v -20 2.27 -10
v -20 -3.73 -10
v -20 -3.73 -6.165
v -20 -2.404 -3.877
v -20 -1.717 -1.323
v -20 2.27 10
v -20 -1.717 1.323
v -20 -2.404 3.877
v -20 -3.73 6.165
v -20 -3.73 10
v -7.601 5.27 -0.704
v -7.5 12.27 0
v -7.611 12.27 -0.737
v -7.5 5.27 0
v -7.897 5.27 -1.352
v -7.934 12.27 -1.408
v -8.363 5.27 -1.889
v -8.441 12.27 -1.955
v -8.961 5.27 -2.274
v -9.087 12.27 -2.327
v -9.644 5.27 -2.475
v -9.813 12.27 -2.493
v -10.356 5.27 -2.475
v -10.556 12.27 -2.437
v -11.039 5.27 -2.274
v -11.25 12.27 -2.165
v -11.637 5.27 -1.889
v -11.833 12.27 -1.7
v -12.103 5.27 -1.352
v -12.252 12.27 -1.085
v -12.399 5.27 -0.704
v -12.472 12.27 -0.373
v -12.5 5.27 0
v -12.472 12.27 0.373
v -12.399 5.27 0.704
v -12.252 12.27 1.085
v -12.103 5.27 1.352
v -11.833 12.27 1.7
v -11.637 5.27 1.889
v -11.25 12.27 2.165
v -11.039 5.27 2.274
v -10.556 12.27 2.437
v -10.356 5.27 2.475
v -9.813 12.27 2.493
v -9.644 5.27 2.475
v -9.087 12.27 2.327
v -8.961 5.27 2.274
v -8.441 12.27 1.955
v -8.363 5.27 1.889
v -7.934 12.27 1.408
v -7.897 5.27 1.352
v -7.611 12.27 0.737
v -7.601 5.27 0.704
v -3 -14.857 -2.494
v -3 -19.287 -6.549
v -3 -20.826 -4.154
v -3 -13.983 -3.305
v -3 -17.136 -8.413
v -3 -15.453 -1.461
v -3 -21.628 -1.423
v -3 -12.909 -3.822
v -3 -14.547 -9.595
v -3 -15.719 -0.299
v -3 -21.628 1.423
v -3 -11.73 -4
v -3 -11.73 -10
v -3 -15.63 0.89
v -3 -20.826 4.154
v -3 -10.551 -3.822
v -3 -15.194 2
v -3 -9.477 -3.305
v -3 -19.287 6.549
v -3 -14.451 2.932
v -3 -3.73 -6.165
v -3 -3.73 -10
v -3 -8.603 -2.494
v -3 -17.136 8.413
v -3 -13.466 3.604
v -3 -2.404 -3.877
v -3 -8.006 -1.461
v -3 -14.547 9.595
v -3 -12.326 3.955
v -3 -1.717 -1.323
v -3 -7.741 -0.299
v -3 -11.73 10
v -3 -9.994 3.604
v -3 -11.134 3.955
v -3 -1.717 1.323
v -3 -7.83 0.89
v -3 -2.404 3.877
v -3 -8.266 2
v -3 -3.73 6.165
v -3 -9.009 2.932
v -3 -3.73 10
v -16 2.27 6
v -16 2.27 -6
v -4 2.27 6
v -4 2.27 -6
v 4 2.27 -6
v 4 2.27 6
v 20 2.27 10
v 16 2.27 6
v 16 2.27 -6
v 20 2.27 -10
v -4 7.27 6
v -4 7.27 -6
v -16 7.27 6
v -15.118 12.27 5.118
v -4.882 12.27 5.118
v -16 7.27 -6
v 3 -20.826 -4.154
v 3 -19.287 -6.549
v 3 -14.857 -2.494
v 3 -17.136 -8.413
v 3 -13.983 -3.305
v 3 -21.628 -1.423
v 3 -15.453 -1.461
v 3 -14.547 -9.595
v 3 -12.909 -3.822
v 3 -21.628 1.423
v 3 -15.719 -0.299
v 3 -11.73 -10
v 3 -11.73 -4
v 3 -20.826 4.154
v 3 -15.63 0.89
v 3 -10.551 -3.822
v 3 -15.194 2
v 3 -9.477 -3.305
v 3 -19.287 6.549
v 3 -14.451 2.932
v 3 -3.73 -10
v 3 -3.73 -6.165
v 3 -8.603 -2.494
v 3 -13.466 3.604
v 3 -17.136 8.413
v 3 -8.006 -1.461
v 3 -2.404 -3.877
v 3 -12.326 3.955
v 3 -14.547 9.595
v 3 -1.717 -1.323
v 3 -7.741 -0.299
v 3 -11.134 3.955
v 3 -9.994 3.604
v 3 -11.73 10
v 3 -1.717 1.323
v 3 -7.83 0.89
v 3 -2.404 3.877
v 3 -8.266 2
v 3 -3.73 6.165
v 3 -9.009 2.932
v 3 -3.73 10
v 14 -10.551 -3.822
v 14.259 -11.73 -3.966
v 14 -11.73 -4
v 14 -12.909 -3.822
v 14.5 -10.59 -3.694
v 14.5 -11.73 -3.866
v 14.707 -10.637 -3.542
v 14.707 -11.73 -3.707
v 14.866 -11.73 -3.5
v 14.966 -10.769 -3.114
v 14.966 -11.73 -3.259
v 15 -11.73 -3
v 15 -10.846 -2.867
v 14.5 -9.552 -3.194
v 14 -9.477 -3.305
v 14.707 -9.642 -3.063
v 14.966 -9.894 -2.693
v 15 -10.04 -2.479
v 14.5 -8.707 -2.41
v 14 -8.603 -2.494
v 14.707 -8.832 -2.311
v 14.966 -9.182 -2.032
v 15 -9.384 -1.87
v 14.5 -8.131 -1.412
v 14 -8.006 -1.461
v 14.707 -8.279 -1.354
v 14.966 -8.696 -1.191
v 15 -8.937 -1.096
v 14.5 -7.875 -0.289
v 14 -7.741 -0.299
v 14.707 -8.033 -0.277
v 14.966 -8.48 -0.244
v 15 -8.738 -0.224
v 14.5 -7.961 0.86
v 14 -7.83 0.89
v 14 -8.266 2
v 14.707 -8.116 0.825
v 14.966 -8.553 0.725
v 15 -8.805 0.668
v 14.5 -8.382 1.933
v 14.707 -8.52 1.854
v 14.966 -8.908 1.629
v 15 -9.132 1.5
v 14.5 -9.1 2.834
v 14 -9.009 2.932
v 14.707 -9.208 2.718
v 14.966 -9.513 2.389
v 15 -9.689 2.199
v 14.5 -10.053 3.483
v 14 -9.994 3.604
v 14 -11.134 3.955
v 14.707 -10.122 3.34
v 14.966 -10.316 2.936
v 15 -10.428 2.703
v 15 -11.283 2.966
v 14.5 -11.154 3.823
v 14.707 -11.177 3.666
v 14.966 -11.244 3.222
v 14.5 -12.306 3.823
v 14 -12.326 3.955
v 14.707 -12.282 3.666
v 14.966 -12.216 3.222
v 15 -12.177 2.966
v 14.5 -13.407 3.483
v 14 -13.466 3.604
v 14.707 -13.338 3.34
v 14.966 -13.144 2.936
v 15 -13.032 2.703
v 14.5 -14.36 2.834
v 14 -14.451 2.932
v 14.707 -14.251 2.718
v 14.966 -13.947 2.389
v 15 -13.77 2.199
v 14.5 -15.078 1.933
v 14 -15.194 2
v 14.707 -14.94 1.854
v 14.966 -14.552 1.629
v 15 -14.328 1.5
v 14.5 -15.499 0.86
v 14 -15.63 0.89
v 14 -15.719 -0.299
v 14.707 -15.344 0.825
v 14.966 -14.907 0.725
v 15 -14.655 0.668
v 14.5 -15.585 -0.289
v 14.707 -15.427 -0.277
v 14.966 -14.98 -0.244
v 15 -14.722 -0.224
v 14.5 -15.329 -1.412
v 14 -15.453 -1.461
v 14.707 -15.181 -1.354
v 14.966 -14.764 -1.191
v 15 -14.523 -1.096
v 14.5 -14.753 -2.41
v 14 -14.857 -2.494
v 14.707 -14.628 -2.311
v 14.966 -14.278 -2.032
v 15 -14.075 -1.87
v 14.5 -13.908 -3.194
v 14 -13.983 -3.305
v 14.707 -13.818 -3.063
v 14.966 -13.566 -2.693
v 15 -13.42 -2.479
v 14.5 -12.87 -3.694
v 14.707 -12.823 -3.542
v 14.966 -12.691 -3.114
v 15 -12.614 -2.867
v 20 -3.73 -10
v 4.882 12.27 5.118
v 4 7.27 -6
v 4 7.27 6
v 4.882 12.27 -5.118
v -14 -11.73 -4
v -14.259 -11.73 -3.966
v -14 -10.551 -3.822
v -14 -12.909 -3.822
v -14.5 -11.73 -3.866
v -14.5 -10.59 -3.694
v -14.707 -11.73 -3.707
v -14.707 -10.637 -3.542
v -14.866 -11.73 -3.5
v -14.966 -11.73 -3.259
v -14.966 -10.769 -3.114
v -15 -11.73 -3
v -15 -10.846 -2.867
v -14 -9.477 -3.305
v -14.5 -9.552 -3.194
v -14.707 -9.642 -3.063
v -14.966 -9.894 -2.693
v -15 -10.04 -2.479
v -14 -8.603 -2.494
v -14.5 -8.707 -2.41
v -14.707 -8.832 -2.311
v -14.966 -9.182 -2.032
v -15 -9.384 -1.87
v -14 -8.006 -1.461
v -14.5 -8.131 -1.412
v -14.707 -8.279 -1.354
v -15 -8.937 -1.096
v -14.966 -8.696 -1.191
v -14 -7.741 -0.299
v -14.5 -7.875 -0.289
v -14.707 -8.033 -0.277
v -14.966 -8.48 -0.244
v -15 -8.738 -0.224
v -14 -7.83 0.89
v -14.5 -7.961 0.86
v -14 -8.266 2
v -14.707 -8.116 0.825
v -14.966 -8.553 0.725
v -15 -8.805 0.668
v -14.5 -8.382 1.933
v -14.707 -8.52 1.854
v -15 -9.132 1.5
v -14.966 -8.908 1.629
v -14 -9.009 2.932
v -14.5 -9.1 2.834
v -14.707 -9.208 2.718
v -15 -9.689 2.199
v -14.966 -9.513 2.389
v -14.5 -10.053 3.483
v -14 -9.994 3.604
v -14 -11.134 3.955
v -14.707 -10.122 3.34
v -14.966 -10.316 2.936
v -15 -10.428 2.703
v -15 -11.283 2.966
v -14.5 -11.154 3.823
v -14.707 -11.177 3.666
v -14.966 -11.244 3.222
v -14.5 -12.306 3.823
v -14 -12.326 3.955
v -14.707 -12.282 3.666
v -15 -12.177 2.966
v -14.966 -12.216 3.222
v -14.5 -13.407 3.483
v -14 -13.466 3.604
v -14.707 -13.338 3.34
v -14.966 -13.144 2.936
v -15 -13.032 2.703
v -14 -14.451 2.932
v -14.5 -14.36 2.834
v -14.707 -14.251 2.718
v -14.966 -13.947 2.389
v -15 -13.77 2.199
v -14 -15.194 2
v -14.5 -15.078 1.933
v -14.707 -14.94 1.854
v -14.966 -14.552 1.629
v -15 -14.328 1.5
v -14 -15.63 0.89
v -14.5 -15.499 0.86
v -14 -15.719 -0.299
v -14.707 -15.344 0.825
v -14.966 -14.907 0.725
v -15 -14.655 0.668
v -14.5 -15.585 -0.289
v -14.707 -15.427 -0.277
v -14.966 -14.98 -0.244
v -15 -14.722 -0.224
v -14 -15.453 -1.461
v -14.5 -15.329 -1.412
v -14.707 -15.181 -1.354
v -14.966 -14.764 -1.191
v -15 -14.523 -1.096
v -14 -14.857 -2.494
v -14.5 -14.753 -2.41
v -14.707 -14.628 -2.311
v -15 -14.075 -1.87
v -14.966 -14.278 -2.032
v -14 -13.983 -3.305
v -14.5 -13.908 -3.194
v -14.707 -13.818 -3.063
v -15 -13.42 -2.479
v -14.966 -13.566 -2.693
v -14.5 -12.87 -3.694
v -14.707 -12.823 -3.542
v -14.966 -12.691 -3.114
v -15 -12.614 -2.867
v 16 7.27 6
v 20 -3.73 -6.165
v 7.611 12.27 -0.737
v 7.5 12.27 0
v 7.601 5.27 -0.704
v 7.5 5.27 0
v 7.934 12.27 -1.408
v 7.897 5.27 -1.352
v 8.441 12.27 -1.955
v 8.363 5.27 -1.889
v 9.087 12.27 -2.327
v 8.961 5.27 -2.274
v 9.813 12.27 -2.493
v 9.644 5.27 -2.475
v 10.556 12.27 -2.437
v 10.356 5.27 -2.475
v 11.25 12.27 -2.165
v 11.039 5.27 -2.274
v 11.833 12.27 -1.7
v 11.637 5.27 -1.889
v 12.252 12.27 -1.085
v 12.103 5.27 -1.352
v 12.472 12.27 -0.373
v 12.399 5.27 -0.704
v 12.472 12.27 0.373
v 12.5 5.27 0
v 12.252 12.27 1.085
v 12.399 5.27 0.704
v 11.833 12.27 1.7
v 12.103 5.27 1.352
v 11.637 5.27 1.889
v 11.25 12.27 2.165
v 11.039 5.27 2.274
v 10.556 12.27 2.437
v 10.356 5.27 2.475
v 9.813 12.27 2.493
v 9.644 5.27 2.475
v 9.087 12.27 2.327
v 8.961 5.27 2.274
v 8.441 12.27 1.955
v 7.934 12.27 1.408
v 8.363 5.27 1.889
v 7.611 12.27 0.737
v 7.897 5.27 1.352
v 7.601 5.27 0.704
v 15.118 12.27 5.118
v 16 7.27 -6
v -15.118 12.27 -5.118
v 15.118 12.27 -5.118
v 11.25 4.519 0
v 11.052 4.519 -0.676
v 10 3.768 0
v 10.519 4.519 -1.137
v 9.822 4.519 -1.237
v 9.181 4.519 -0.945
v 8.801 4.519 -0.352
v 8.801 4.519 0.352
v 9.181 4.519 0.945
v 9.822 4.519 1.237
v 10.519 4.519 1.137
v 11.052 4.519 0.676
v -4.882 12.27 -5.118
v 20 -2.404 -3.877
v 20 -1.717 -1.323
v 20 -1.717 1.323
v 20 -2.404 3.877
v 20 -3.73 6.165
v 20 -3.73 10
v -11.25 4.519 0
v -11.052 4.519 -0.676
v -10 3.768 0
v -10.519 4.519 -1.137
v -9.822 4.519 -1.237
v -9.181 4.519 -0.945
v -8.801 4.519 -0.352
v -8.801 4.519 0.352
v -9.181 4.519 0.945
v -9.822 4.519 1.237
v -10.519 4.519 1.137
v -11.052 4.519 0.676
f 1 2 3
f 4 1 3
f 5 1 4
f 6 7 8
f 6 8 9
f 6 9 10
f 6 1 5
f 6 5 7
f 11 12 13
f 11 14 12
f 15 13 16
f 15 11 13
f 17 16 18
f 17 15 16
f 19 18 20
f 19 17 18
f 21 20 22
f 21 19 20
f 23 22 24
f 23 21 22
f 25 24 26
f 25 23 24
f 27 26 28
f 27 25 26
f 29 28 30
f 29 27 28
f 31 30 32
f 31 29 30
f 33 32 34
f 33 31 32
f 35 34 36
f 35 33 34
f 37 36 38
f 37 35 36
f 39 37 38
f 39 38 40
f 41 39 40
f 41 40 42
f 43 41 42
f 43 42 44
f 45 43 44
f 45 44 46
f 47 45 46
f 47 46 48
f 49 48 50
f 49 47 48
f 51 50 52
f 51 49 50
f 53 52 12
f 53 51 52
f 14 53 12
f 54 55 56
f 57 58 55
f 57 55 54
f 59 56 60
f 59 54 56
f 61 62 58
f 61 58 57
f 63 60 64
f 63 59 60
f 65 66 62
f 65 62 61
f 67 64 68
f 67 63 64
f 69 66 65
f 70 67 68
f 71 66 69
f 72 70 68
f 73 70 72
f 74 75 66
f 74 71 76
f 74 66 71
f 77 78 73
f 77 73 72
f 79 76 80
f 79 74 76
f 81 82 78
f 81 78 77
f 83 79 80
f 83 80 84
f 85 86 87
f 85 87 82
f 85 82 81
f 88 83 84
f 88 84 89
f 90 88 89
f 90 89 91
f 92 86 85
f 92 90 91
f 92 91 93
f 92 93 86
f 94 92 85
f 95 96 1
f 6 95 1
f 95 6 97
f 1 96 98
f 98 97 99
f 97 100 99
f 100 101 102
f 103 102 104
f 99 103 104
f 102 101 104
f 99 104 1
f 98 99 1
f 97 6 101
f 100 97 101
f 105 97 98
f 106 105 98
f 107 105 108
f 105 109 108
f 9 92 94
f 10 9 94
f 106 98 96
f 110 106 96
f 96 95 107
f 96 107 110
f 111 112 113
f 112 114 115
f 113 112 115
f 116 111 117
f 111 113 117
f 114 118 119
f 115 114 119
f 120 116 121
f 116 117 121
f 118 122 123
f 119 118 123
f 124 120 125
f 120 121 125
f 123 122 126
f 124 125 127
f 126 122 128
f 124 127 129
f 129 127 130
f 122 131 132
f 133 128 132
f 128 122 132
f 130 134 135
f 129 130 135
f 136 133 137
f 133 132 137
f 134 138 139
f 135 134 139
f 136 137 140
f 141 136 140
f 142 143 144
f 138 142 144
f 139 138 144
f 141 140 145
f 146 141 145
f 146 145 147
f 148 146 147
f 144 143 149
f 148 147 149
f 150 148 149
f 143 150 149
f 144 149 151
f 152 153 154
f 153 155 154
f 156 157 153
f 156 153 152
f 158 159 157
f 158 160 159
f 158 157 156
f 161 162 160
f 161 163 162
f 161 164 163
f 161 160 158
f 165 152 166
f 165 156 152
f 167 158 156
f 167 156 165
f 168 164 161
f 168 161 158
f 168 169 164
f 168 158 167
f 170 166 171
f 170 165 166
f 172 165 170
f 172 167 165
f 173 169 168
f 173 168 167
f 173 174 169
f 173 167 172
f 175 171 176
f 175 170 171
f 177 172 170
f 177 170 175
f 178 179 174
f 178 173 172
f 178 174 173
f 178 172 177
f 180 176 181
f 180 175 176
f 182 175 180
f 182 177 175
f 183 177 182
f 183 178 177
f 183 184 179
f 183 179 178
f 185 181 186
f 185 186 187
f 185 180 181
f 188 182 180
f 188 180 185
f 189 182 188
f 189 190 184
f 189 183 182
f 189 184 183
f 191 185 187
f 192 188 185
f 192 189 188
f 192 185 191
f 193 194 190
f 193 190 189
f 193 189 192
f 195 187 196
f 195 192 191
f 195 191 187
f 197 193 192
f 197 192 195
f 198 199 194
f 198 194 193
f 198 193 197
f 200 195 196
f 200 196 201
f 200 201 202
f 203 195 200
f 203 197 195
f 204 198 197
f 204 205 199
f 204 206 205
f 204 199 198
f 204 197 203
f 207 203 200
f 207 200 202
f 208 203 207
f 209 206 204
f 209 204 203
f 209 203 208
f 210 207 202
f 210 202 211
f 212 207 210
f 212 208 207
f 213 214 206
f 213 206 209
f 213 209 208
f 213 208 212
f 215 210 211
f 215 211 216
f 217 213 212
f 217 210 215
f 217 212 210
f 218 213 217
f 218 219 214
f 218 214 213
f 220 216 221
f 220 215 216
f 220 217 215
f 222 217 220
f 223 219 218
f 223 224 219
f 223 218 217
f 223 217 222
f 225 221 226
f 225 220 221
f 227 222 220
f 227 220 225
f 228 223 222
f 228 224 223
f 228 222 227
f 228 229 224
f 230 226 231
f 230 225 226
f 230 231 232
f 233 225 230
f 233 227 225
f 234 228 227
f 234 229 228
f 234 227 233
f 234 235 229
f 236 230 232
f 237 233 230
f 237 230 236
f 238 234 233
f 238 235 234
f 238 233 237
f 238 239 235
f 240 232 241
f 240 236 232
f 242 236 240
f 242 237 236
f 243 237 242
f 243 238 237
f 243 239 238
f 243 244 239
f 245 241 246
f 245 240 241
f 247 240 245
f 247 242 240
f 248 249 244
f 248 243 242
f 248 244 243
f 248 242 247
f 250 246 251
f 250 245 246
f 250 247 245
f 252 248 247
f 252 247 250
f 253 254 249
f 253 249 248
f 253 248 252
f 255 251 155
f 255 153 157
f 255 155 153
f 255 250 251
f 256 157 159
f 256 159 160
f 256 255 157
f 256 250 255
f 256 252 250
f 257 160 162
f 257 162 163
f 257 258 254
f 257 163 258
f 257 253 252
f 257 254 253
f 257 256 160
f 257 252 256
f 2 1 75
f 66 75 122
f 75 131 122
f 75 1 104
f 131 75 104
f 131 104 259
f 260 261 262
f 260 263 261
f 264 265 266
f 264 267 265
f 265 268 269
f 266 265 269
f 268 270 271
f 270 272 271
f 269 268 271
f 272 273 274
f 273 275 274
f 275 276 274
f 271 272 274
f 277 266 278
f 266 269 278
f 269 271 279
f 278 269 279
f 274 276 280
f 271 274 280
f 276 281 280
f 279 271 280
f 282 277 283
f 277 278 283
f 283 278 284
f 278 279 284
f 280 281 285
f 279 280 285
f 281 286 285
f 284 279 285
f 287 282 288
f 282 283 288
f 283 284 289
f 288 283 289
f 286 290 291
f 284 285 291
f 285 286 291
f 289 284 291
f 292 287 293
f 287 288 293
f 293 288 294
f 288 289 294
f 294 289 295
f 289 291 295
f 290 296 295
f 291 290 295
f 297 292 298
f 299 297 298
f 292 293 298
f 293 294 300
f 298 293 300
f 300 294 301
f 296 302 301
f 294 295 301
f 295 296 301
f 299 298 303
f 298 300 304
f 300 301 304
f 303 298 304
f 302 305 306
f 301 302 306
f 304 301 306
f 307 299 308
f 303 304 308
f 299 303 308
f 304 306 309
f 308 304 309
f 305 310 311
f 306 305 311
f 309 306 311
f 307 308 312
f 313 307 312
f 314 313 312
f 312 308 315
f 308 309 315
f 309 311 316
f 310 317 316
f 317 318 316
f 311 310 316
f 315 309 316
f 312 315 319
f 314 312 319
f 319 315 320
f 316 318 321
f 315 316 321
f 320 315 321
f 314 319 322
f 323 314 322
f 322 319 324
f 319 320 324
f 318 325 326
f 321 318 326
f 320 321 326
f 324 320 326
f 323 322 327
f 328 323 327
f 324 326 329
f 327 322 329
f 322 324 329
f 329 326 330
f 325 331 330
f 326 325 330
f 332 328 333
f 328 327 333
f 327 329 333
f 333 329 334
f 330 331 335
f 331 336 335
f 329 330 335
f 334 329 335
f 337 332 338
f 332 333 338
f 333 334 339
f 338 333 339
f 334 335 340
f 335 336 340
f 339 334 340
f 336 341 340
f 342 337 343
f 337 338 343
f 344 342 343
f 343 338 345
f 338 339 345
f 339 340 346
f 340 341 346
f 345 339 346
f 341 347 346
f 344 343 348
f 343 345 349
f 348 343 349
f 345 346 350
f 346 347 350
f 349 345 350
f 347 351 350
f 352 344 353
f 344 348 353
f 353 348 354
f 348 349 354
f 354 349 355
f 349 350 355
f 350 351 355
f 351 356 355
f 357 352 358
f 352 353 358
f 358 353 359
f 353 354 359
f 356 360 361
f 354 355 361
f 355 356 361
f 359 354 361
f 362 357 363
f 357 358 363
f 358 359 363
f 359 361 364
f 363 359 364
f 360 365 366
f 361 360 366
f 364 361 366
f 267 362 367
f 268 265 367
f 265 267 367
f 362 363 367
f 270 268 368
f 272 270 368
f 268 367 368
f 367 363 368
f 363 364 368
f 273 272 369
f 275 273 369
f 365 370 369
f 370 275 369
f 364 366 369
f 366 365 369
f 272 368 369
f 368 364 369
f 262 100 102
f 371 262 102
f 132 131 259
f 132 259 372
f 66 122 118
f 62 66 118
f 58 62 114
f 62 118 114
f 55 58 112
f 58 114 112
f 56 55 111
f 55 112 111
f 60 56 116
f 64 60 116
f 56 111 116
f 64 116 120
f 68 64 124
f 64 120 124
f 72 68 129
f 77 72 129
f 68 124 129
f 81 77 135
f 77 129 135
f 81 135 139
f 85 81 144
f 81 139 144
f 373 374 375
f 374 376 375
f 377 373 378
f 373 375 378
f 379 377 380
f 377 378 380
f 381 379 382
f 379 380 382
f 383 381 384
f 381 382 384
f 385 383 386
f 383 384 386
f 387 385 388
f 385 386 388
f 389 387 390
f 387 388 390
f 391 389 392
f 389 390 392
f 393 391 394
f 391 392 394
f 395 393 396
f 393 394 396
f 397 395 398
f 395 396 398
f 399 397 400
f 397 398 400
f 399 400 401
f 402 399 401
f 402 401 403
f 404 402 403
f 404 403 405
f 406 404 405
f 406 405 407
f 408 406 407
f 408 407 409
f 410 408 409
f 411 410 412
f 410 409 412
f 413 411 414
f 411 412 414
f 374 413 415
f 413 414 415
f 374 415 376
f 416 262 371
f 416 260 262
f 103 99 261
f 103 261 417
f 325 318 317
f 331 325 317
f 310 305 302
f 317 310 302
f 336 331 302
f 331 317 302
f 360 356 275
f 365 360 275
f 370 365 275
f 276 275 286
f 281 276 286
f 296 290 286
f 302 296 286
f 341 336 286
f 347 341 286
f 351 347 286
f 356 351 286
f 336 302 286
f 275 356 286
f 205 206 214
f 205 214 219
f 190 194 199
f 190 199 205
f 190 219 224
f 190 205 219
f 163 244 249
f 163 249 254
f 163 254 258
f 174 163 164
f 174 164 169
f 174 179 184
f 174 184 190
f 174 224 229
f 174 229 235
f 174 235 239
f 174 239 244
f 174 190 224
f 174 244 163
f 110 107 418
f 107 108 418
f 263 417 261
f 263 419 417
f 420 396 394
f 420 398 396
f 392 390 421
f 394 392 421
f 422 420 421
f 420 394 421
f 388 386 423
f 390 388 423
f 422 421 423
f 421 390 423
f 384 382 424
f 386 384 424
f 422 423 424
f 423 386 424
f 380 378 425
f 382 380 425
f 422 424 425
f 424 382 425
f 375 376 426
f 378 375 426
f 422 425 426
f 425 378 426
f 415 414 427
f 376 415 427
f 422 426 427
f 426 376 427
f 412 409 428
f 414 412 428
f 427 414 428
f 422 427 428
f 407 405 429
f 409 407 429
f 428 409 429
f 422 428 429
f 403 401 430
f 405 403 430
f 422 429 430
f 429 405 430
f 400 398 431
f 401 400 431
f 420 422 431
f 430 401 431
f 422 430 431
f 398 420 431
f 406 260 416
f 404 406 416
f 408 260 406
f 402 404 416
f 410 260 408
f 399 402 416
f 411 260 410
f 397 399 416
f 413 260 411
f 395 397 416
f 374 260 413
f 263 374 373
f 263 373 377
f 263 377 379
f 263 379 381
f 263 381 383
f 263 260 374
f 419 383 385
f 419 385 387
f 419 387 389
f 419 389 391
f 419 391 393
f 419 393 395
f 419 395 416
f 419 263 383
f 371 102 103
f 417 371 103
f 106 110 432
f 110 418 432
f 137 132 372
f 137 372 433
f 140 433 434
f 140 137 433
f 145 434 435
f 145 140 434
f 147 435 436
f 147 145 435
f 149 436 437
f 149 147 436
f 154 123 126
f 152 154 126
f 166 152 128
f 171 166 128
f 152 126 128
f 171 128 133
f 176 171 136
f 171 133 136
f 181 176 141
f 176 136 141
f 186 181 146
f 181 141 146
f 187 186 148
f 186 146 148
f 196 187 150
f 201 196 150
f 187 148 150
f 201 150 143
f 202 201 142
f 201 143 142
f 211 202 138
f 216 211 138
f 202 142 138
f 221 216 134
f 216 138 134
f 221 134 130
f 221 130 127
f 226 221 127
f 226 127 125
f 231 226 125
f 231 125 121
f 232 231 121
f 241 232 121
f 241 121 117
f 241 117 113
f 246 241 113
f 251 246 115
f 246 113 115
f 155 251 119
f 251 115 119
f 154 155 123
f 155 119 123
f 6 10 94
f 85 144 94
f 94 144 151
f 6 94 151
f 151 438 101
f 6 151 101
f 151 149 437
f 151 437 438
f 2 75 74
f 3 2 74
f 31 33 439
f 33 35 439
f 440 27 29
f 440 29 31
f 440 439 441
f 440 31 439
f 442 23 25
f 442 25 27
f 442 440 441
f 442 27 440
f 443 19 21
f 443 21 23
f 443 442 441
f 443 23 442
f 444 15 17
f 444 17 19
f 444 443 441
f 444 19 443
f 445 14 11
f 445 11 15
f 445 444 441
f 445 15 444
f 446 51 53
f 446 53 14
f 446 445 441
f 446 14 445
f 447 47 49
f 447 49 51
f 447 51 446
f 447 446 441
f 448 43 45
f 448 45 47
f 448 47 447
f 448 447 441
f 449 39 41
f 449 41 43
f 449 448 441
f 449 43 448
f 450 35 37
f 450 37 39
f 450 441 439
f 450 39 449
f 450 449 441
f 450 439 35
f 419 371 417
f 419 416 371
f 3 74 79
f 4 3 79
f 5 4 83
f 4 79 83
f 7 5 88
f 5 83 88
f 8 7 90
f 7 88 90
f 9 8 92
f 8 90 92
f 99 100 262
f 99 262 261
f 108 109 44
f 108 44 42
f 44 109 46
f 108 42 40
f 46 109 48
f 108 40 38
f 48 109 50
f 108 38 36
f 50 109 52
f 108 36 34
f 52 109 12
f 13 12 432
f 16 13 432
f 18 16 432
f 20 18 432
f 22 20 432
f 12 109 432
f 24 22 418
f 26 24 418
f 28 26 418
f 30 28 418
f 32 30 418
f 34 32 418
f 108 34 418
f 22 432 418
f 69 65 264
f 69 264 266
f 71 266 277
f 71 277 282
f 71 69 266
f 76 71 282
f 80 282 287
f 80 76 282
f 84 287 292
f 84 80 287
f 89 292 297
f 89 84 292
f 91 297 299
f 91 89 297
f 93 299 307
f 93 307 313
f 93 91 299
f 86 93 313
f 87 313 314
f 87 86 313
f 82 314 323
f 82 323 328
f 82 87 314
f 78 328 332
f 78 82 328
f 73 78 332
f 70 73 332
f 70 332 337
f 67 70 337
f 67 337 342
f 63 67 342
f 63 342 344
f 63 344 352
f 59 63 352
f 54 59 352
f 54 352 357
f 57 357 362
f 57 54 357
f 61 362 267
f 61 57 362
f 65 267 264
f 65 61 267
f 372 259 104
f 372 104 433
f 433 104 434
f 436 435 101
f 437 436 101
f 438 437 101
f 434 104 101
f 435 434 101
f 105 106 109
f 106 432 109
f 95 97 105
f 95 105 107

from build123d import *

# Parameters (mm, degrees)
LEG_CONNECTOR_DEPTH                            = 1.5
TORSO_CONNECTOR_DEPTH                          = 8.5
SKETCH3_R                                      = 2
LEG_PIN_DEPTH                                  = 6
SKETCH4_W                                      = 6
SKETCH4_H                                      = 6
TORSO_PIN_BASE_DEPTH                           = 2.5
SKETCH5_W                                      = 6
SKETCH5_H                                      = 6
TORSO_PIN_TIP_DEPTH                            = 2.5
TORSO_PIN_TIP_TAPER                            = 10
HOLE_THAT_MAKE_IT_EASY_TO_ADD_CENTER_LIN_D     = 2.5
HOLE_THAT_MAKE_IT_EASY_TO_ADD_CENTER_LIN_DEPTH = 3.5
HOLE_THAT_MAKE_IT_EASY_TO_ADD_CENTER_LIN_TIP   = 0.751075774
EASY_LEG_INSERT_R                              = 0.5
SCALE1_SCALE                                   = 2


with BuildPart() as part:
    # Sketch1 → Leg connector (new body)
    with BuildSketch(Plane(origin=(0, 0, 0), x_dir=(0, 0, -1), z_dir=(1, 0, 0))):
        with BuildLine():
            Line((-5, 0), (5, 0))
            Line((5, 0), (5, -7))
            ThreePointArc((5, -7), (0, -12), (-5, -7))
            Line((-5, -7), (-5, 0))
        make_face()
    extrude(amount=LEG_CONNECTOR_DEPTH)

    # Sketch2 → Torso connector (add)
    with BuildSketch(Plane(origin=(1.5, 0, 0), x_dir=(0, 0, -1), z_dir=(1, 0, 0))):
        with BuildLine():
            Line((-5, 0), (5, 0))
            Line((5, 0), (5, -3))
            Line((5, -3), (3.082612528, -3))
            ThreePointArc((3.082612528, -3), (0, -1.95), (-3.082612528, -3))
            Line((-3.082612528, -3), (-5, -3))
            Line((-5, -3), (-5, 0))
        make_face()
    extrude(amount=TORSO_CONNECTOR_DEPTH)

    # Sketch3 → Leg pin (add)
    with BuildSketch(Plane(origin=(1.5, 0, 0), x_dir=(0, 0, -1), z_dir=(1, 0, 0))):
        with Locations((0, -7)):
            Circle(SKETCH3_R)
    extrude(amount=LEG_PIN_DEPTH)

    # Sketch4 → Torso pin base (add)
    with BuildSketch(Plane(origin=(0, 0, 0), x_dir=(1, 0, 0), z_dir=(0, 1, 0))):
        with Locations((5, 0)):
            Rectangle(SKETCH4_W, SKETCH4_H)
    extrude(amount=TORSO_PIN_BASE_DEPTH)

    # Sketch5 → Torso pin tip (add)
    with BuildSketch(Plane(origin=(0, 2.5, 0), x_dir=(1, 0, 0), z_dir=(0, 1, 0))):
        with Locations((5, 0)):
            Rectangle(SKETCH5_W, SKETCH5_H)
    extrude(amount=TORSO_PIN_TIP_DEPTH, taper=TORSO_PIN_TIP_TAPER)

    # Hole that make it easy to add center lines
    with Locations(Plane(origin=(0, 5, 0), x_dir=(1, 0, 0), z_dir=(0, 1, 0))):
        with Locations((5, 0)):
            Hole(HOLE_THAT_MAKE_IT_EASY_TO_ADD_CENTER_LIN_D / 2, depth=HOLE_THAT_MAKE_IT_EASY_TO_ADD_CENTER_LIN_DEPTH)
            with Locations((0, 0, -(HOLE_THAT_MAKE_IT_EASY_TO_ADD_CENTER_LIN_DEPTH + HOLE_THAT_MAKE_IT_EASY_TO_ADD_CENTER_LIN_TIP / 2))):  # 118° drill point
                Cone(0, HOLE_THAT_MAKE_IT_EASY_TO_ADD_CENTER_LIN_D / 2, HOLE_THAT_MAKE_IT_EASY_TO_ADD_CENTER_LIN_TIP, mode=Mode.SUBTRACT)

    # Easy leg insert
    easy_leg_insert_edges = [part.edges().sort_by_distance(p)[0] for p in [
        (7.5, -7, 2),
    ]]
    fillet(easy_leg_insert_edges, radius=EASY_LEG_INSERT_R)

    # Making symetrical: part across plane


with BuildPart() as part_1:
    add(part.part)
    add(part.part.mirror(Plane(origin=(0, -7, 0), x_dir=(0, 0, 1), z_dir=(1, 0, 0))))


with BuildPart() as part_2:
    # Scale1: scaled about (0, -2.270029125, 0)
    add(part_1.part.scale(SCALE1_SCALE).moved(Location((0, 2.270029125, 0))))


solid = part_2.part
